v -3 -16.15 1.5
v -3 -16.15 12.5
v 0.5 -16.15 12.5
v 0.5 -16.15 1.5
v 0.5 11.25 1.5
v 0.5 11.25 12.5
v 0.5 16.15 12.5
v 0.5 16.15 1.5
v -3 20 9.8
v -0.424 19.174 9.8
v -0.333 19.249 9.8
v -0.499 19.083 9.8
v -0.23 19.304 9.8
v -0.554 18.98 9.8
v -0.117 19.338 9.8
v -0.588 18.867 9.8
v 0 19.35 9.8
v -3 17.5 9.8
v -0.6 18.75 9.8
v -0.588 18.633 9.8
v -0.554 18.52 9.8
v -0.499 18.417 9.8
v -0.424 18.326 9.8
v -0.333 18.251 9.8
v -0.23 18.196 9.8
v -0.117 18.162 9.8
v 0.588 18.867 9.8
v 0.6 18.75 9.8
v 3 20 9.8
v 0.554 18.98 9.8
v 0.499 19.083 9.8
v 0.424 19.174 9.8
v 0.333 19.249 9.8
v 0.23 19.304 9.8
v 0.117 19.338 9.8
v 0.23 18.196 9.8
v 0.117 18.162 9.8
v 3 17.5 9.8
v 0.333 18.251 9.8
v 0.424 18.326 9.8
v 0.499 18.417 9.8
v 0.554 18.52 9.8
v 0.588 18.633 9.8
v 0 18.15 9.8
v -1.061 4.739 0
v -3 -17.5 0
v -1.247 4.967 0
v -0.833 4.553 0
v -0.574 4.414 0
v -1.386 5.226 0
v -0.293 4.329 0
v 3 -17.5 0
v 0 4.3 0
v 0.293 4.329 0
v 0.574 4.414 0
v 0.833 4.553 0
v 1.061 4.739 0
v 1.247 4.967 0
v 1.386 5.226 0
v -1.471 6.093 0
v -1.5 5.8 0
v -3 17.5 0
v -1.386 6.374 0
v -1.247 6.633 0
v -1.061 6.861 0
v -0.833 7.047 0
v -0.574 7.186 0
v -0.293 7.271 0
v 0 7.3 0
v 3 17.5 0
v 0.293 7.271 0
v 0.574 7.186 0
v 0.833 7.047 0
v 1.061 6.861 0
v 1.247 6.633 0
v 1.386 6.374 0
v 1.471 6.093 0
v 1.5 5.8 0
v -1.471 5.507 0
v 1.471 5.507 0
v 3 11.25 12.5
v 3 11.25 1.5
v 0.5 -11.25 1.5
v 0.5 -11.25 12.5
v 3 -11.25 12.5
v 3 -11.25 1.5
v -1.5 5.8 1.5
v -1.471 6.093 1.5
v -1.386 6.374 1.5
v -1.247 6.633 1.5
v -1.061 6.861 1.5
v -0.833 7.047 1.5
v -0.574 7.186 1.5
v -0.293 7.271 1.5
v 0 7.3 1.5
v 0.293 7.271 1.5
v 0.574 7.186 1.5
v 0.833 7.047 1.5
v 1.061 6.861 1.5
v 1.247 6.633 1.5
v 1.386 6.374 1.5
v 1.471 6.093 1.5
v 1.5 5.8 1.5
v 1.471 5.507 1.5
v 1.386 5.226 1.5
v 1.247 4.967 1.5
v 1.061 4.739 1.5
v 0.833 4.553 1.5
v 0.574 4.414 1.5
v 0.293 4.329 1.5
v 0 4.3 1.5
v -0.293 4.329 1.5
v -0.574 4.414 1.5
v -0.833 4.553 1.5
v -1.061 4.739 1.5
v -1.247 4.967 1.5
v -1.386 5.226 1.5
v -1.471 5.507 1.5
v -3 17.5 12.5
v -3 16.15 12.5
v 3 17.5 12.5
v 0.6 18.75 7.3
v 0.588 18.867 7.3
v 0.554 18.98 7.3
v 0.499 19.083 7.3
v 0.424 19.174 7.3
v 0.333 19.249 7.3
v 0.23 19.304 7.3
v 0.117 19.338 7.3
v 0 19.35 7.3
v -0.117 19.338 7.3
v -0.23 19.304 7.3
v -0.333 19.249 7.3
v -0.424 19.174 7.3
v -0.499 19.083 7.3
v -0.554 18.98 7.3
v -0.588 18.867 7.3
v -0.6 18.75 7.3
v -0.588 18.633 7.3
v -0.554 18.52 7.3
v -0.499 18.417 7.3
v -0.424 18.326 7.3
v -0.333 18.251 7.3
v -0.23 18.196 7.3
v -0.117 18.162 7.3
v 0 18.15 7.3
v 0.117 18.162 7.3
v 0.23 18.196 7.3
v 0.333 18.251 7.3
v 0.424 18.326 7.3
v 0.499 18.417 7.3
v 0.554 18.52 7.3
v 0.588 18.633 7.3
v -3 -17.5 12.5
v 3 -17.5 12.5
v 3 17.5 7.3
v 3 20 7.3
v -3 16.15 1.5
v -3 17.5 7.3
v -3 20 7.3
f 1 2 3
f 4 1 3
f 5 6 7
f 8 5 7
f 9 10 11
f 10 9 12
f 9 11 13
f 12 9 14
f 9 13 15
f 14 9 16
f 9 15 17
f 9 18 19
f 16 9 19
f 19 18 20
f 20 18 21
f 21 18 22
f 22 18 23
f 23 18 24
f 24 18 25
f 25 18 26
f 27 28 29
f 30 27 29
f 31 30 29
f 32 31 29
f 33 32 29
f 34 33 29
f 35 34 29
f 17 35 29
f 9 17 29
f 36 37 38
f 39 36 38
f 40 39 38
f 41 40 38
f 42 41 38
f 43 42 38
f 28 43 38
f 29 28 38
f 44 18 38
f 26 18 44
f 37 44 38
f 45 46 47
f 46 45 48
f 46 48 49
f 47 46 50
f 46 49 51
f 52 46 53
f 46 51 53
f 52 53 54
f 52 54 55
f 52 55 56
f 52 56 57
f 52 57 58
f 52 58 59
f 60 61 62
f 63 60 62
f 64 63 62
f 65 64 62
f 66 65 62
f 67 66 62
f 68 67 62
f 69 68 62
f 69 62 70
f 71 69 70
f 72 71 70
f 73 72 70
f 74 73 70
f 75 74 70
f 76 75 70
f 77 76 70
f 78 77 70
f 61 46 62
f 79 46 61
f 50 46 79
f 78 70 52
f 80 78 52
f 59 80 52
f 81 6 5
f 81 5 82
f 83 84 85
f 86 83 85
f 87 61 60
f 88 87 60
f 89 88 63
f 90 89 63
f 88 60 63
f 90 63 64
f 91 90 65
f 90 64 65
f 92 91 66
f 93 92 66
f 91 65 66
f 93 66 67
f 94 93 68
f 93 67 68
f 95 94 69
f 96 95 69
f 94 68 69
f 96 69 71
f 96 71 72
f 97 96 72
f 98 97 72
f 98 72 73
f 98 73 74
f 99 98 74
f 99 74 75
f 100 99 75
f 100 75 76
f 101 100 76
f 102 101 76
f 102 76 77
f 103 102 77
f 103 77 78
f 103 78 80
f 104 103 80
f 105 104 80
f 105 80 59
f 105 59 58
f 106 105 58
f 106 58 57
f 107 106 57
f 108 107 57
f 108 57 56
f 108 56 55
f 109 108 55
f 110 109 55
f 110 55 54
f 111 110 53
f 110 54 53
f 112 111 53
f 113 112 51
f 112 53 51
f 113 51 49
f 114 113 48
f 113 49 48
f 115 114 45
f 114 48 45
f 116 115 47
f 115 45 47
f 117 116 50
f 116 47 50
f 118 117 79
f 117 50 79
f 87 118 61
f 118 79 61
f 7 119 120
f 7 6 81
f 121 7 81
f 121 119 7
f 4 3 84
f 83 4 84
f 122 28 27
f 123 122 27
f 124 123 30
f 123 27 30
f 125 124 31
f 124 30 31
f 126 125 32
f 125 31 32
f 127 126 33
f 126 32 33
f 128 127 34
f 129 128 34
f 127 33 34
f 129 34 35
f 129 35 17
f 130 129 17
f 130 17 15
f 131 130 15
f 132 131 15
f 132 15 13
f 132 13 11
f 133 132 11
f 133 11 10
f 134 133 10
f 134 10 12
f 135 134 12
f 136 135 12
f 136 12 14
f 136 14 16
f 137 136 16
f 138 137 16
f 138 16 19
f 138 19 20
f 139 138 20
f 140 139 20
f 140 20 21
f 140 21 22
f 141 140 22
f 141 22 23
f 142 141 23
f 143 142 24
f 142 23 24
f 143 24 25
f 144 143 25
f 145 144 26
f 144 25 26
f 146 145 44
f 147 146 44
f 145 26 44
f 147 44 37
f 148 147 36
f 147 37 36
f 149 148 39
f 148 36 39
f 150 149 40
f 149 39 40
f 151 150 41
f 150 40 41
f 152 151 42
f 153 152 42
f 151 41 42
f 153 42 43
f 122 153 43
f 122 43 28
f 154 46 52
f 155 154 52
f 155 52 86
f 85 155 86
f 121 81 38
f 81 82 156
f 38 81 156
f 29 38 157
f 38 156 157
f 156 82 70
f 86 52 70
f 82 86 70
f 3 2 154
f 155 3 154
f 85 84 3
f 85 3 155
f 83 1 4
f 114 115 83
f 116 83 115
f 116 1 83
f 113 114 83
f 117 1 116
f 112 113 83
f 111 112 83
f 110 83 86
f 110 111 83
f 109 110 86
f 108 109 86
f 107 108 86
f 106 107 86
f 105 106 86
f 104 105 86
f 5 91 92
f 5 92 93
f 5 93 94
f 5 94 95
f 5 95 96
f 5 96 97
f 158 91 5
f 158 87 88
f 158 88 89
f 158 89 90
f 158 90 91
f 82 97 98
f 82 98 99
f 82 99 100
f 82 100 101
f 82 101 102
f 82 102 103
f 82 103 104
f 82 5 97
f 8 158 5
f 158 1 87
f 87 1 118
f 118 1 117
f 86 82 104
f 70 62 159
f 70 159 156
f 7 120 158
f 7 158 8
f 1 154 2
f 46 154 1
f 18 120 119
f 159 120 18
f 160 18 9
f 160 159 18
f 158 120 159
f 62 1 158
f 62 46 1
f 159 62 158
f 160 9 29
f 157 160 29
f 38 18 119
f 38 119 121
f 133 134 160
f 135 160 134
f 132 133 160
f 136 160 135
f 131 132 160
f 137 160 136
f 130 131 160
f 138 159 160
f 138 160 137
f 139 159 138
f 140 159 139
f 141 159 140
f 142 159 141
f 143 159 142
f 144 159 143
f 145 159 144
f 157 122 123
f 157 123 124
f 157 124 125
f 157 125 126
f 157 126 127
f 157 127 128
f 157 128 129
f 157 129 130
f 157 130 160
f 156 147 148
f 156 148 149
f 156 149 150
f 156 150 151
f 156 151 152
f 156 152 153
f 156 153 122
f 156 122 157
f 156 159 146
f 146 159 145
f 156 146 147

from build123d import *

# Parameters (mm, degrees)
CROQUIS1_W                 = 6
CROQUIS1_H                 = 35
SALIENTE_EXTRUIR1_DEPTH    = 12.5
CROQUIS2_W                 = 6
CROQUIS2_H                 = 22.5
CORTAR_EXTRUIR1_DEPTH      = 11
CROQUIS3_R                 = 1.5
CORTAR_EXTRUIR2_DEPTH      = 1
CORTAR_EXTRUIR2_DEPTH_BACK = 13.5
CROQUIS4_W                 = 3.5
CROQUIS4_H                 = 4.9
CORTAR_EXTRUIR3_DEPTH      = 1
CORTAR_EXTRUIR3_DEPTH_BACK = 11
CROQUIS5_W                 = 6
CROQUIS5_H                 = 2.5
SALIENTE_EXTRUIR2_DEPTH    = 2.5
CROQUIS6_R                 = 0.6
CORTAR_EXTRUIR4_DEPTH      = 3.7
CORTAR_EXTRUIR4_DEPTH_BACK = 10.8


with BuildPart() as part:
    # Croquis1 → Saliente-Extruir1 (new body)
    with BuildSketch(Plane.XY):
        Rectangle(CROQUIS1_W, CROQUIS1_H)
    extrude(amount=SALIENTE_EXTRUIR1_DEPTH)

    # Croquis2 → Cortar-Extruir1 (cut)
    with BuildSketch(Plane.XY.offset(12.5)):
        Rectangle(CROQUIS2_W, CROQUIS2_H)
    extrude(amount=-CORTAR_EXTRUIR1_DEPTH, mode=Mode.SUBTRACT)

    # Croquis3 → Cortar-Extruir2 (cut, two sides)
    with BuildSketch(Plane(origin=(0, 0, 0), x_dir=(-1, 0, 0), z_dir=(0, 0, -1))) as cortar_extruir2_sk:
        with Locations((0, 5.8)):
            Circle(CROQUIS3_R)
    extrude(amount=CORTAR_EXTRUIR2_DEPTH, mode=Mode.SUBTRACT)
    extrude(cortar_extruir2_sk.sketch, amount=-CORTAR_EXTRUIR2_DEPTH_BACK, mode=Mode.SUBTRACT)

    # Croquis4 → Cortar-Extruir3 (cut, two sides)
    with BuildSketch(Plane.XY.offset(12.5)) as cortar_extruir3_sk:
        with Locations((-1.25, 13.7)):
            Rectangle(CROQUIS4_W, CROQUIS4_H)
        with Locations((-1.25, -13.7)):
            Rectangle(CROQUIS4_W, CROQUIS4_H)
    extrude(amount=CORTAR_EXTRUIR3_DEPTH, mode=Mode.SUBTRACT)
    extrude(cortar_extruir3_sk.sketch, amount=-CORTAR_EXTRUIR3_DEPTH_BACK, mode=Mode.SUBTRACT)

    # Croquis5 → Saliente-Extruir2 (add)
    with BuildSketch(Plane.XZ.offset(-17.5)):
        with Locations((0, 8.55)):
            Rectangle(CROQUIS5_W, CROQUIS5_H)
    extrude(amount=-SALIENTE_EXTRUIR2_DEPTH)

    # Croquis6 → Cortar-Extruir4 (cut, two sides)
    with BuildSketch(Plane.XY.offset(9.8)) as cortar_extruir4_sk:
        with Locations((0, 18.75)):
            Circle(CROQUIS6_R)
    extrude(amount=CORTAR_EXTRUIR4_DEPTH, mode=Mode.SUBTRACT)
    extrude(cortar_extruir4_sk.sketch, amount=-CORTAR_EXTRUIR4_DEPTH_BACK, mode=Mode.SUBTRACT)


solid = part.part
